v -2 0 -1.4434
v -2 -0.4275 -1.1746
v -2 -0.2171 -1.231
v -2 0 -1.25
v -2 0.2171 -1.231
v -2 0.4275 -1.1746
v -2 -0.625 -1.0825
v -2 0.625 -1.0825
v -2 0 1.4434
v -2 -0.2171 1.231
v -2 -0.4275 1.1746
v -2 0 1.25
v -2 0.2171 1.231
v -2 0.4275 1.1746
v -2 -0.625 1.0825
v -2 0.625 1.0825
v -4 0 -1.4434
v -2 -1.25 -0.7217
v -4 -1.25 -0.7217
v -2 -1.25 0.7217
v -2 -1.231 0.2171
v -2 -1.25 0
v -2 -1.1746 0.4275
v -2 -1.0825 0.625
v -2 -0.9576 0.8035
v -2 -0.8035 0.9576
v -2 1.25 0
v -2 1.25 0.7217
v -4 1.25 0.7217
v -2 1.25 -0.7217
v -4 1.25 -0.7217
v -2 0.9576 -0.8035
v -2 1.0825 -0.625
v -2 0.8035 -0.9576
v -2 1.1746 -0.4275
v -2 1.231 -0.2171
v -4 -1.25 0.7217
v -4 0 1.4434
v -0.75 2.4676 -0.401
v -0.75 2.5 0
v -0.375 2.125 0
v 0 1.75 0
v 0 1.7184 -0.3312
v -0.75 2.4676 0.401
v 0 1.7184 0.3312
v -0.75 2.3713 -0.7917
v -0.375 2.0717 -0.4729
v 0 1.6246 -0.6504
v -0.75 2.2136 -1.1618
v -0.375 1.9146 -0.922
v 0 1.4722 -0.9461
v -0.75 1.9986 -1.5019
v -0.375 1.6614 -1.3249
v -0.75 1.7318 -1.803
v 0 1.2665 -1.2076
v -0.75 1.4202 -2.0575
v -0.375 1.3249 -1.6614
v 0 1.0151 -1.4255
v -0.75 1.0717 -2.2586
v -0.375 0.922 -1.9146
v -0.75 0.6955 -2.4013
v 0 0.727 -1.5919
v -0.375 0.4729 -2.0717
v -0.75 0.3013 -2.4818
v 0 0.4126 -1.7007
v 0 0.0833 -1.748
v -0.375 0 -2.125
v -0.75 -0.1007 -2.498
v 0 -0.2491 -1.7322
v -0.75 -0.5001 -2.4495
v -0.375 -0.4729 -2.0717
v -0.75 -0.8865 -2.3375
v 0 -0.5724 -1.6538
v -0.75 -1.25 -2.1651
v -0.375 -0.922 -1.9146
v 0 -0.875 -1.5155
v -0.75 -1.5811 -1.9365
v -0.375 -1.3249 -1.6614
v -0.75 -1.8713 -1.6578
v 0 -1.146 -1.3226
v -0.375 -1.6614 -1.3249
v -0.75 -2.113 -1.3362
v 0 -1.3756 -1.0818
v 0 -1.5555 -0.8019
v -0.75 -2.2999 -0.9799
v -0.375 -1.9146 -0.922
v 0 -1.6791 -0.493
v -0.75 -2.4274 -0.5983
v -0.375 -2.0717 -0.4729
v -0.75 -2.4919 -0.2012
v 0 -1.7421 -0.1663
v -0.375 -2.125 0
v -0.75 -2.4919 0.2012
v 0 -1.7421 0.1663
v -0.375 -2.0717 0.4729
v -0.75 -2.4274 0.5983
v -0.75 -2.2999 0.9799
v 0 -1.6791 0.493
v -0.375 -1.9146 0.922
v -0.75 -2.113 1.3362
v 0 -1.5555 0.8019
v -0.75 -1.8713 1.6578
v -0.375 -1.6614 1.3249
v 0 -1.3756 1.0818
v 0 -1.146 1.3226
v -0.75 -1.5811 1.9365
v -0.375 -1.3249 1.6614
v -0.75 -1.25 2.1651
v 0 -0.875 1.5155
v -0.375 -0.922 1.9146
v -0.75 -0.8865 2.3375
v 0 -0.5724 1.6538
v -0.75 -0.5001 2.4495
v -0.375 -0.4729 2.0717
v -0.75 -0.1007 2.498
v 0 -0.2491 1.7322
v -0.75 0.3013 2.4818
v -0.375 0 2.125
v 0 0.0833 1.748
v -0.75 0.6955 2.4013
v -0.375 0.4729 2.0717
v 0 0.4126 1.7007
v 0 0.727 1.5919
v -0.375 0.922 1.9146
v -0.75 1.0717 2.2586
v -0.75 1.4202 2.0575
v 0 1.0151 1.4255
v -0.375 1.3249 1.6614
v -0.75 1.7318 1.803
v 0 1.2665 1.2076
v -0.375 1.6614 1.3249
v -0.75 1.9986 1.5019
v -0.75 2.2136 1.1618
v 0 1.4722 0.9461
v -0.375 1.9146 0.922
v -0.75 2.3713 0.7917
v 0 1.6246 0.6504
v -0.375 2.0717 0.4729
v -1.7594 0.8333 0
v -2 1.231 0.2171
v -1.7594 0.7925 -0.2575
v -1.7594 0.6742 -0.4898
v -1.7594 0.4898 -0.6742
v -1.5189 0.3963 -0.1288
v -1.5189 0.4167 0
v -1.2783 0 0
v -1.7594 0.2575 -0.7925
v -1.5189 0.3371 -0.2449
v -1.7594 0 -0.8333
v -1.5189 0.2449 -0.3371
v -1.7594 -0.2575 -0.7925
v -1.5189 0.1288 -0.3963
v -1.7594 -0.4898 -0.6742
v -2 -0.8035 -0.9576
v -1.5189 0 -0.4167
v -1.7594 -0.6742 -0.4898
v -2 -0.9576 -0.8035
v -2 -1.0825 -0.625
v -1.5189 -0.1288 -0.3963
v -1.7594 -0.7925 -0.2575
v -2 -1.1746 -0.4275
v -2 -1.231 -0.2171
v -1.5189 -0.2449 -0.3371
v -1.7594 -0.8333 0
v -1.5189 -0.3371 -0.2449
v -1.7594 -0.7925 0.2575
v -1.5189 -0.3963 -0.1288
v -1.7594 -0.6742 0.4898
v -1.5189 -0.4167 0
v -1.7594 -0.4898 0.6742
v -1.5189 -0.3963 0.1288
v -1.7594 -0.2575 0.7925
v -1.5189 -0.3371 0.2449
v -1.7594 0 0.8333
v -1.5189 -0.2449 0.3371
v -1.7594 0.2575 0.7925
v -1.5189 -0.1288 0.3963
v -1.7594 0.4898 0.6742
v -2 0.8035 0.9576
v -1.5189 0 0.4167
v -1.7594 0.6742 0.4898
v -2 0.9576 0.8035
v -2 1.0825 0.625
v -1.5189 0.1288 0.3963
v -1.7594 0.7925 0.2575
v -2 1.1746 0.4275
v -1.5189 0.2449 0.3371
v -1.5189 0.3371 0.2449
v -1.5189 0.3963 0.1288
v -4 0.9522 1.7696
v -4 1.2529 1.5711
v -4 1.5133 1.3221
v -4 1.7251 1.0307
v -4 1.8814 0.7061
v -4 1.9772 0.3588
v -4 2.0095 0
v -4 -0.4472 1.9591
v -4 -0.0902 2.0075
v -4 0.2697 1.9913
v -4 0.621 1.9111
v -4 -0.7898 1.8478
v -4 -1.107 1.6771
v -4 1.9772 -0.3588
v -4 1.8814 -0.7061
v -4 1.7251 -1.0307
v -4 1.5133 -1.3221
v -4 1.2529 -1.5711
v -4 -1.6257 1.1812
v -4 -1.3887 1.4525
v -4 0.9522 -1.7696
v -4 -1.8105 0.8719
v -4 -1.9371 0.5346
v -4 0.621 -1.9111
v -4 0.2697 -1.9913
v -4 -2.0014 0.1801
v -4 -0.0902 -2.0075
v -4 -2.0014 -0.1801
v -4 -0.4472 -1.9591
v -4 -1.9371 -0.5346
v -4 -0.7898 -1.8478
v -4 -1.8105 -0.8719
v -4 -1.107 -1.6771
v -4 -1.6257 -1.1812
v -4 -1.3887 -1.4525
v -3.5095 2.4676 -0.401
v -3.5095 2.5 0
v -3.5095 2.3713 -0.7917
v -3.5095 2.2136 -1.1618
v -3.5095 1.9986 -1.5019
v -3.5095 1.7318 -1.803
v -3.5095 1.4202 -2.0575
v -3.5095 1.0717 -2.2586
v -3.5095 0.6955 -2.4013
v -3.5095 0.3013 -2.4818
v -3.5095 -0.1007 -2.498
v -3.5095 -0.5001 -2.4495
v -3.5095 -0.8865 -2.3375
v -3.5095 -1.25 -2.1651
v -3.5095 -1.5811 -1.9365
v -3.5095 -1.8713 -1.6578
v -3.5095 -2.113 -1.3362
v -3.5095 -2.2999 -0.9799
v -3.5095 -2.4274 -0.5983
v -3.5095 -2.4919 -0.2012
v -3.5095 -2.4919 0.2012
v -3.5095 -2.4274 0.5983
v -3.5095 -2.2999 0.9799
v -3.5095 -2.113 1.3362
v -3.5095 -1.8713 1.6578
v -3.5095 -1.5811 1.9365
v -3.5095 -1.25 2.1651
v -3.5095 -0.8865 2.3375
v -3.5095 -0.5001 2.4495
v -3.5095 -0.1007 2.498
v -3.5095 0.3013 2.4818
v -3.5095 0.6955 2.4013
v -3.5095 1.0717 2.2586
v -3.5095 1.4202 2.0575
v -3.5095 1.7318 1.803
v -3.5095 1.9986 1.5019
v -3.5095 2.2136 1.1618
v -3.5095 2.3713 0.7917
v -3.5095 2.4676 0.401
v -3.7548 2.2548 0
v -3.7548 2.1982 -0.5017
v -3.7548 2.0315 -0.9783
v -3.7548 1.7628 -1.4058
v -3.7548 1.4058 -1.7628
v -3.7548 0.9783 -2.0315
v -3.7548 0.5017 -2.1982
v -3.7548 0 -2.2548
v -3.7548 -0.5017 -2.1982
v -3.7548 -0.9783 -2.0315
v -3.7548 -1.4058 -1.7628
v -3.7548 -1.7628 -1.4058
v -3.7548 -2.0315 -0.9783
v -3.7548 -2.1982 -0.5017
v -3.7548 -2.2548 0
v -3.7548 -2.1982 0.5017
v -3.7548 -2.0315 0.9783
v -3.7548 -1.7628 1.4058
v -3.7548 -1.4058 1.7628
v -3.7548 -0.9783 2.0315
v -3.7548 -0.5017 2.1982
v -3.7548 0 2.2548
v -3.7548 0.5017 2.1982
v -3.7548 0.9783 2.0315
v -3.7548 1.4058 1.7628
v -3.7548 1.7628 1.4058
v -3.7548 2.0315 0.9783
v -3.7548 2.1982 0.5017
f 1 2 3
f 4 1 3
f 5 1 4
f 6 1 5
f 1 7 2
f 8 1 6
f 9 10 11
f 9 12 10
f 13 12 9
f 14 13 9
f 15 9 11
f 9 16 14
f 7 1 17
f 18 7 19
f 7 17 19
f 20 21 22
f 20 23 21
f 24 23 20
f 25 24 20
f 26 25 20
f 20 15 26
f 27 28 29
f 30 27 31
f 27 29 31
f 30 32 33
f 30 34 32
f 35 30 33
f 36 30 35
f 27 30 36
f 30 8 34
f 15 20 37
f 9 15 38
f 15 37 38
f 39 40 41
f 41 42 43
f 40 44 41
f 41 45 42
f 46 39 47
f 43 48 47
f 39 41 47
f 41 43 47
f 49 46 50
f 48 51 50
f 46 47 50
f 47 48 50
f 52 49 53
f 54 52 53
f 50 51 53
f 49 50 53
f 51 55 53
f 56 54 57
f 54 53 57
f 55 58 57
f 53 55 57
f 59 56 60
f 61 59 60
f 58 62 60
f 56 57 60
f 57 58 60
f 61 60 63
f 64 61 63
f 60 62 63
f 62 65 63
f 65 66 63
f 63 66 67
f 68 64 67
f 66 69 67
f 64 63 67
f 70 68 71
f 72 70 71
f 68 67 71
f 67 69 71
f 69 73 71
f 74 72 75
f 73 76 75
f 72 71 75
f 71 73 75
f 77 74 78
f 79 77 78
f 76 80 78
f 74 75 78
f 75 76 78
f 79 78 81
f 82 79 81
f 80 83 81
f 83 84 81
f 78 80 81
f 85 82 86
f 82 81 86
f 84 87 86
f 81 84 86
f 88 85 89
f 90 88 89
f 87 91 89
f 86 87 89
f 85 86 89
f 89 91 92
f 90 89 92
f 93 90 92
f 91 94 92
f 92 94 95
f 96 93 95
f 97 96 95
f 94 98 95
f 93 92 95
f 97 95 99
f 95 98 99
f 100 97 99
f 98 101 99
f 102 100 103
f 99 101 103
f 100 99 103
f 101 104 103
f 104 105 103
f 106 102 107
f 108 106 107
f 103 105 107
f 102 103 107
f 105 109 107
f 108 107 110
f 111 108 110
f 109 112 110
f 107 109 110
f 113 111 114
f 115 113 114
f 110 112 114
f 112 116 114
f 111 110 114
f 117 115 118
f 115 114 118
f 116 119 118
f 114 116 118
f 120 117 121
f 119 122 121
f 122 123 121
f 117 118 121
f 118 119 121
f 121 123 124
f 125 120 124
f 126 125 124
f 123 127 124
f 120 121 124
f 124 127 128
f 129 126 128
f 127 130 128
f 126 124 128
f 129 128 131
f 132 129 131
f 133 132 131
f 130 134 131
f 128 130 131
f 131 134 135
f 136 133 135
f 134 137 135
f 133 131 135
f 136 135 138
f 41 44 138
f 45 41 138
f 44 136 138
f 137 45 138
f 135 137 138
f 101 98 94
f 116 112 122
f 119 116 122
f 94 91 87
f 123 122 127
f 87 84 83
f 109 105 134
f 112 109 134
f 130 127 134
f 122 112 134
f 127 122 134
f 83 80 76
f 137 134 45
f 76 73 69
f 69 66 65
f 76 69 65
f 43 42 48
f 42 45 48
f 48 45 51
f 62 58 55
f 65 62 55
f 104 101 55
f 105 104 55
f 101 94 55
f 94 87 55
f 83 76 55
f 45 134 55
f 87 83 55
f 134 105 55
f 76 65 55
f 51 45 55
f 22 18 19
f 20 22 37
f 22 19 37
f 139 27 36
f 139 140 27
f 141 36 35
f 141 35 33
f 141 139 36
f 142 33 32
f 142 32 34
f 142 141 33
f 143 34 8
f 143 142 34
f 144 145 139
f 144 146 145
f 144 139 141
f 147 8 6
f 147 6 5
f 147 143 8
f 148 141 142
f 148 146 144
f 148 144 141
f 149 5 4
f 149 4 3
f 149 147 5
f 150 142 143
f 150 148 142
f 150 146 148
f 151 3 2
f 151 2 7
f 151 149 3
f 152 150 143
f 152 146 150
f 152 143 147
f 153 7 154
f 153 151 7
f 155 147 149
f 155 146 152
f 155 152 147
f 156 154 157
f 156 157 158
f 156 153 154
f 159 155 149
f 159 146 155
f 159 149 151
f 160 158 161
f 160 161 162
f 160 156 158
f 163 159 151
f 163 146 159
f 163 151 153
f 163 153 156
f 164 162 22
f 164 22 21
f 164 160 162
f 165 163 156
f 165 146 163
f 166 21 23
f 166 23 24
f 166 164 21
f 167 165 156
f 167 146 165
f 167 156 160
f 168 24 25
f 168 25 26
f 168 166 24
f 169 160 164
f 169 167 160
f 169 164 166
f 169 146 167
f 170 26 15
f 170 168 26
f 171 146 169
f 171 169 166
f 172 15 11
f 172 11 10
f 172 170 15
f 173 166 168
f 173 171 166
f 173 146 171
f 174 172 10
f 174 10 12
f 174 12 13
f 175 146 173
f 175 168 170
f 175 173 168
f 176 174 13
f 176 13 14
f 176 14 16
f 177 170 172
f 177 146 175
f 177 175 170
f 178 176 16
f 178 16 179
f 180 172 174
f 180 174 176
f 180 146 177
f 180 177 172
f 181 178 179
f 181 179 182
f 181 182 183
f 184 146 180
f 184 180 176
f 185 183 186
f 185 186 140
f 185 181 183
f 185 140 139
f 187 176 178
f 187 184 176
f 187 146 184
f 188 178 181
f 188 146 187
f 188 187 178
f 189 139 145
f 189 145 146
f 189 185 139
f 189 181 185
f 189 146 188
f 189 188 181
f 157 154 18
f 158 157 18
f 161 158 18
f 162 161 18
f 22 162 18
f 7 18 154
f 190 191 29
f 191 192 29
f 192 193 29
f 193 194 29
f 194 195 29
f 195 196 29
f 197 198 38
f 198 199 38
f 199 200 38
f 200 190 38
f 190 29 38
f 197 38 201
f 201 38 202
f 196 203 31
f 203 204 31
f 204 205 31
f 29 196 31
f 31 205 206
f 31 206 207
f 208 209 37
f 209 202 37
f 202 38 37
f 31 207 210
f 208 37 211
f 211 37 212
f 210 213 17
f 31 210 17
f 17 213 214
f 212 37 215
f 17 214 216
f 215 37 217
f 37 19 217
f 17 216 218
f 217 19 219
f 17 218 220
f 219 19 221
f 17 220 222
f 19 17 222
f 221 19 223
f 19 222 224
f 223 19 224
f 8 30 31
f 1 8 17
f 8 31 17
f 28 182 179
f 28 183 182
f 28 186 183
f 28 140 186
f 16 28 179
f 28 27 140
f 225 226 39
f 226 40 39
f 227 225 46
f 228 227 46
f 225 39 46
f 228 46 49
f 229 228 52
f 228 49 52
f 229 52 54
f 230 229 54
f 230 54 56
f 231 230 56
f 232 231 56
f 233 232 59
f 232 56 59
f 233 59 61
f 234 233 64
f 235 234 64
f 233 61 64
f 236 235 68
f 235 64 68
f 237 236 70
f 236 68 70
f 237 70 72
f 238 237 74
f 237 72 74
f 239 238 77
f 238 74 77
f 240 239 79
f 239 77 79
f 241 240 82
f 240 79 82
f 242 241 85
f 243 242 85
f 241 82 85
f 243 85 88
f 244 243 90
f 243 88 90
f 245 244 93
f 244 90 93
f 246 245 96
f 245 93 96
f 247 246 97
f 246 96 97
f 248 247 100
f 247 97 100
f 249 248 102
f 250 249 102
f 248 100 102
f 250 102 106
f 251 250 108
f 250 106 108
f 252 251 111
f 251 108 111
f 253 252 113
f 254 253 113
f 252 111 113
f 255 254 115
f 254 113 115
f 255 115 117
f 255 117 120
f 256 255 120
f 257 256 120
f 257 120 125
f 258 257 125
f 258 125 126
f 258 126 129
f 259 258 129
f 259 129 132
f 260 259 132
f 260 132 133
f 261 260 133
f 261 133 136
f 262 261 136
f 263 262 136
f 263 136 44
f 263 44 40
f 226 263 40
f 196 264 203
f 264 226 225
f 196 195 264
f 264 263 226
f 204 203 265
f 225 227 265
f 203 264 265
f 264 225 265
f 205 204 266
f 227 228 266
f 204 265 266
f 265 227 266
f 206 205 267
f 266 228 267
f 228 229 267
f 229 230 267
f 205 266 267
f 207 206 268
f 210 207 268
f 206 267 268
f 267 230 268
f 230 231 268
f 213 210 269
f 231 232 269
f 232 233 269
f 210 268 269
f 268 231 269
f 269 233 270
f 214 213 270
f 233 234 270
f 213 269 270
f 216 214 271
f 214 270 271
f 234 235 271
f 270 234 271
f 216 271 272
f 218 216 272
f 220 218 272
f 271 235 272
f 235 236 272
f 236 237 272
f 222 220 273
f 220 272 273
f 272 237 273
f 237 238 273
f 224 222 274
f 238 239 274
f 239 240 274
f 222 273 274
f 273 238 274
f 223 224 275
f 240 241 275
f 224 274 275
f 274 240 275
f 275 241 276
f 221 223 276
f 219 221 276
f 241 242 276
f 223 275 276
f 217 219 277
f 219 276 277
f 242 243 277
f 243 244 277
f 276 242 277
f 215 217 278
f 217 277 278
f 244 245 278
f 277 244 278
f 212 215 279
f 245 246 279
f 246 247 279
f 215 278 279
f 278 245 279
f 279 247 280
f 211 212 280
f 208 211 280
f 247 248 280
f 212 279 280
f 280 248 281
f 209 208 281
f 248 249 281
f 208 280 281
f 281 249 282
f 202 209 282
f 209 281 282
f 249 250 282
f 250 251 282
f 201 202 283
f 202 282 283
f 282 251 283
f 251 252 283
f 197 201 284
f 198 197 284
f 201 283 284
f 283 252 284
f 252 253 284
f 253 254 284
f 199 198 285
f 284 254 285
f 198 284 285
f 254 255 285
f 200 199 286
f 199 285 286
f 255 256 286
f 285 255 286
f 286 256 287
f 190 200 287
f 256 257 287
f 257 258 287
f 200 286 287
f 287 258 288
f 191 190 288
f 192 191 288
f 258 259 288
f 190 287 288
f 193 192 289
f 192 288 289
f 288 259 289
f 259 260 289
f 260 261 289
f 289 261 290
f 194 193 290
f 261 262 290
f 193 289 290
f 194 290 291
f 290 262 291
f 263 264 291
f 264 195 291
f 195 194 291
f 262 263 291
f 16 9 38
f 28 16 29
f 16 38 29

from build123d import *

# Parameters (mm, degrees)
CUT_EXTRUDE_1_DEPTH = 2


with BuildPart() as part:
    # ｽｹｯﾁ1 → 回転1 (revolve)
    with BuildSketch(Plane.XY):
        Polygon((-4, 0), (-4, 2.0095), (-3.5095, 2.5), (-0.75, 2.5), (0, 1.75), (0, 0), align=None)
    revolve(axis=Axis((0, 0, 0), (-1, 0, 0)))

    # ｽｹｯﾁ2 → ｶｯﾄ - 押し出し1 (cut)
    with BuildSketch(Plane.ZY.offset(4)):
        Polygon((0.721687836, -1.25), (1.443375673, 0), (0.721687836, 1.25), (-0.721687836, 1.25), (-1.443375673, 0), (-0.721687836, -1.25), align=None)
    extrude(amount=-CUT_EXTRUDE_1_DEPTH, mode=Mode.SUBTRACT)

    # ｽｹｯﾁ3 → ｶｯﾄ - 回転1 (revolve, cut)
    with BuildSketch(Plane.XY):
        Polygon((-2, 0), (-2, 1.25), (-1.278312164, 0), align=None)
    revolve(axis=Axis((-1.278312164, 0, 0), (-1, 0, 0)), mode=Mode.SUBTRACT)


solid = part.part
